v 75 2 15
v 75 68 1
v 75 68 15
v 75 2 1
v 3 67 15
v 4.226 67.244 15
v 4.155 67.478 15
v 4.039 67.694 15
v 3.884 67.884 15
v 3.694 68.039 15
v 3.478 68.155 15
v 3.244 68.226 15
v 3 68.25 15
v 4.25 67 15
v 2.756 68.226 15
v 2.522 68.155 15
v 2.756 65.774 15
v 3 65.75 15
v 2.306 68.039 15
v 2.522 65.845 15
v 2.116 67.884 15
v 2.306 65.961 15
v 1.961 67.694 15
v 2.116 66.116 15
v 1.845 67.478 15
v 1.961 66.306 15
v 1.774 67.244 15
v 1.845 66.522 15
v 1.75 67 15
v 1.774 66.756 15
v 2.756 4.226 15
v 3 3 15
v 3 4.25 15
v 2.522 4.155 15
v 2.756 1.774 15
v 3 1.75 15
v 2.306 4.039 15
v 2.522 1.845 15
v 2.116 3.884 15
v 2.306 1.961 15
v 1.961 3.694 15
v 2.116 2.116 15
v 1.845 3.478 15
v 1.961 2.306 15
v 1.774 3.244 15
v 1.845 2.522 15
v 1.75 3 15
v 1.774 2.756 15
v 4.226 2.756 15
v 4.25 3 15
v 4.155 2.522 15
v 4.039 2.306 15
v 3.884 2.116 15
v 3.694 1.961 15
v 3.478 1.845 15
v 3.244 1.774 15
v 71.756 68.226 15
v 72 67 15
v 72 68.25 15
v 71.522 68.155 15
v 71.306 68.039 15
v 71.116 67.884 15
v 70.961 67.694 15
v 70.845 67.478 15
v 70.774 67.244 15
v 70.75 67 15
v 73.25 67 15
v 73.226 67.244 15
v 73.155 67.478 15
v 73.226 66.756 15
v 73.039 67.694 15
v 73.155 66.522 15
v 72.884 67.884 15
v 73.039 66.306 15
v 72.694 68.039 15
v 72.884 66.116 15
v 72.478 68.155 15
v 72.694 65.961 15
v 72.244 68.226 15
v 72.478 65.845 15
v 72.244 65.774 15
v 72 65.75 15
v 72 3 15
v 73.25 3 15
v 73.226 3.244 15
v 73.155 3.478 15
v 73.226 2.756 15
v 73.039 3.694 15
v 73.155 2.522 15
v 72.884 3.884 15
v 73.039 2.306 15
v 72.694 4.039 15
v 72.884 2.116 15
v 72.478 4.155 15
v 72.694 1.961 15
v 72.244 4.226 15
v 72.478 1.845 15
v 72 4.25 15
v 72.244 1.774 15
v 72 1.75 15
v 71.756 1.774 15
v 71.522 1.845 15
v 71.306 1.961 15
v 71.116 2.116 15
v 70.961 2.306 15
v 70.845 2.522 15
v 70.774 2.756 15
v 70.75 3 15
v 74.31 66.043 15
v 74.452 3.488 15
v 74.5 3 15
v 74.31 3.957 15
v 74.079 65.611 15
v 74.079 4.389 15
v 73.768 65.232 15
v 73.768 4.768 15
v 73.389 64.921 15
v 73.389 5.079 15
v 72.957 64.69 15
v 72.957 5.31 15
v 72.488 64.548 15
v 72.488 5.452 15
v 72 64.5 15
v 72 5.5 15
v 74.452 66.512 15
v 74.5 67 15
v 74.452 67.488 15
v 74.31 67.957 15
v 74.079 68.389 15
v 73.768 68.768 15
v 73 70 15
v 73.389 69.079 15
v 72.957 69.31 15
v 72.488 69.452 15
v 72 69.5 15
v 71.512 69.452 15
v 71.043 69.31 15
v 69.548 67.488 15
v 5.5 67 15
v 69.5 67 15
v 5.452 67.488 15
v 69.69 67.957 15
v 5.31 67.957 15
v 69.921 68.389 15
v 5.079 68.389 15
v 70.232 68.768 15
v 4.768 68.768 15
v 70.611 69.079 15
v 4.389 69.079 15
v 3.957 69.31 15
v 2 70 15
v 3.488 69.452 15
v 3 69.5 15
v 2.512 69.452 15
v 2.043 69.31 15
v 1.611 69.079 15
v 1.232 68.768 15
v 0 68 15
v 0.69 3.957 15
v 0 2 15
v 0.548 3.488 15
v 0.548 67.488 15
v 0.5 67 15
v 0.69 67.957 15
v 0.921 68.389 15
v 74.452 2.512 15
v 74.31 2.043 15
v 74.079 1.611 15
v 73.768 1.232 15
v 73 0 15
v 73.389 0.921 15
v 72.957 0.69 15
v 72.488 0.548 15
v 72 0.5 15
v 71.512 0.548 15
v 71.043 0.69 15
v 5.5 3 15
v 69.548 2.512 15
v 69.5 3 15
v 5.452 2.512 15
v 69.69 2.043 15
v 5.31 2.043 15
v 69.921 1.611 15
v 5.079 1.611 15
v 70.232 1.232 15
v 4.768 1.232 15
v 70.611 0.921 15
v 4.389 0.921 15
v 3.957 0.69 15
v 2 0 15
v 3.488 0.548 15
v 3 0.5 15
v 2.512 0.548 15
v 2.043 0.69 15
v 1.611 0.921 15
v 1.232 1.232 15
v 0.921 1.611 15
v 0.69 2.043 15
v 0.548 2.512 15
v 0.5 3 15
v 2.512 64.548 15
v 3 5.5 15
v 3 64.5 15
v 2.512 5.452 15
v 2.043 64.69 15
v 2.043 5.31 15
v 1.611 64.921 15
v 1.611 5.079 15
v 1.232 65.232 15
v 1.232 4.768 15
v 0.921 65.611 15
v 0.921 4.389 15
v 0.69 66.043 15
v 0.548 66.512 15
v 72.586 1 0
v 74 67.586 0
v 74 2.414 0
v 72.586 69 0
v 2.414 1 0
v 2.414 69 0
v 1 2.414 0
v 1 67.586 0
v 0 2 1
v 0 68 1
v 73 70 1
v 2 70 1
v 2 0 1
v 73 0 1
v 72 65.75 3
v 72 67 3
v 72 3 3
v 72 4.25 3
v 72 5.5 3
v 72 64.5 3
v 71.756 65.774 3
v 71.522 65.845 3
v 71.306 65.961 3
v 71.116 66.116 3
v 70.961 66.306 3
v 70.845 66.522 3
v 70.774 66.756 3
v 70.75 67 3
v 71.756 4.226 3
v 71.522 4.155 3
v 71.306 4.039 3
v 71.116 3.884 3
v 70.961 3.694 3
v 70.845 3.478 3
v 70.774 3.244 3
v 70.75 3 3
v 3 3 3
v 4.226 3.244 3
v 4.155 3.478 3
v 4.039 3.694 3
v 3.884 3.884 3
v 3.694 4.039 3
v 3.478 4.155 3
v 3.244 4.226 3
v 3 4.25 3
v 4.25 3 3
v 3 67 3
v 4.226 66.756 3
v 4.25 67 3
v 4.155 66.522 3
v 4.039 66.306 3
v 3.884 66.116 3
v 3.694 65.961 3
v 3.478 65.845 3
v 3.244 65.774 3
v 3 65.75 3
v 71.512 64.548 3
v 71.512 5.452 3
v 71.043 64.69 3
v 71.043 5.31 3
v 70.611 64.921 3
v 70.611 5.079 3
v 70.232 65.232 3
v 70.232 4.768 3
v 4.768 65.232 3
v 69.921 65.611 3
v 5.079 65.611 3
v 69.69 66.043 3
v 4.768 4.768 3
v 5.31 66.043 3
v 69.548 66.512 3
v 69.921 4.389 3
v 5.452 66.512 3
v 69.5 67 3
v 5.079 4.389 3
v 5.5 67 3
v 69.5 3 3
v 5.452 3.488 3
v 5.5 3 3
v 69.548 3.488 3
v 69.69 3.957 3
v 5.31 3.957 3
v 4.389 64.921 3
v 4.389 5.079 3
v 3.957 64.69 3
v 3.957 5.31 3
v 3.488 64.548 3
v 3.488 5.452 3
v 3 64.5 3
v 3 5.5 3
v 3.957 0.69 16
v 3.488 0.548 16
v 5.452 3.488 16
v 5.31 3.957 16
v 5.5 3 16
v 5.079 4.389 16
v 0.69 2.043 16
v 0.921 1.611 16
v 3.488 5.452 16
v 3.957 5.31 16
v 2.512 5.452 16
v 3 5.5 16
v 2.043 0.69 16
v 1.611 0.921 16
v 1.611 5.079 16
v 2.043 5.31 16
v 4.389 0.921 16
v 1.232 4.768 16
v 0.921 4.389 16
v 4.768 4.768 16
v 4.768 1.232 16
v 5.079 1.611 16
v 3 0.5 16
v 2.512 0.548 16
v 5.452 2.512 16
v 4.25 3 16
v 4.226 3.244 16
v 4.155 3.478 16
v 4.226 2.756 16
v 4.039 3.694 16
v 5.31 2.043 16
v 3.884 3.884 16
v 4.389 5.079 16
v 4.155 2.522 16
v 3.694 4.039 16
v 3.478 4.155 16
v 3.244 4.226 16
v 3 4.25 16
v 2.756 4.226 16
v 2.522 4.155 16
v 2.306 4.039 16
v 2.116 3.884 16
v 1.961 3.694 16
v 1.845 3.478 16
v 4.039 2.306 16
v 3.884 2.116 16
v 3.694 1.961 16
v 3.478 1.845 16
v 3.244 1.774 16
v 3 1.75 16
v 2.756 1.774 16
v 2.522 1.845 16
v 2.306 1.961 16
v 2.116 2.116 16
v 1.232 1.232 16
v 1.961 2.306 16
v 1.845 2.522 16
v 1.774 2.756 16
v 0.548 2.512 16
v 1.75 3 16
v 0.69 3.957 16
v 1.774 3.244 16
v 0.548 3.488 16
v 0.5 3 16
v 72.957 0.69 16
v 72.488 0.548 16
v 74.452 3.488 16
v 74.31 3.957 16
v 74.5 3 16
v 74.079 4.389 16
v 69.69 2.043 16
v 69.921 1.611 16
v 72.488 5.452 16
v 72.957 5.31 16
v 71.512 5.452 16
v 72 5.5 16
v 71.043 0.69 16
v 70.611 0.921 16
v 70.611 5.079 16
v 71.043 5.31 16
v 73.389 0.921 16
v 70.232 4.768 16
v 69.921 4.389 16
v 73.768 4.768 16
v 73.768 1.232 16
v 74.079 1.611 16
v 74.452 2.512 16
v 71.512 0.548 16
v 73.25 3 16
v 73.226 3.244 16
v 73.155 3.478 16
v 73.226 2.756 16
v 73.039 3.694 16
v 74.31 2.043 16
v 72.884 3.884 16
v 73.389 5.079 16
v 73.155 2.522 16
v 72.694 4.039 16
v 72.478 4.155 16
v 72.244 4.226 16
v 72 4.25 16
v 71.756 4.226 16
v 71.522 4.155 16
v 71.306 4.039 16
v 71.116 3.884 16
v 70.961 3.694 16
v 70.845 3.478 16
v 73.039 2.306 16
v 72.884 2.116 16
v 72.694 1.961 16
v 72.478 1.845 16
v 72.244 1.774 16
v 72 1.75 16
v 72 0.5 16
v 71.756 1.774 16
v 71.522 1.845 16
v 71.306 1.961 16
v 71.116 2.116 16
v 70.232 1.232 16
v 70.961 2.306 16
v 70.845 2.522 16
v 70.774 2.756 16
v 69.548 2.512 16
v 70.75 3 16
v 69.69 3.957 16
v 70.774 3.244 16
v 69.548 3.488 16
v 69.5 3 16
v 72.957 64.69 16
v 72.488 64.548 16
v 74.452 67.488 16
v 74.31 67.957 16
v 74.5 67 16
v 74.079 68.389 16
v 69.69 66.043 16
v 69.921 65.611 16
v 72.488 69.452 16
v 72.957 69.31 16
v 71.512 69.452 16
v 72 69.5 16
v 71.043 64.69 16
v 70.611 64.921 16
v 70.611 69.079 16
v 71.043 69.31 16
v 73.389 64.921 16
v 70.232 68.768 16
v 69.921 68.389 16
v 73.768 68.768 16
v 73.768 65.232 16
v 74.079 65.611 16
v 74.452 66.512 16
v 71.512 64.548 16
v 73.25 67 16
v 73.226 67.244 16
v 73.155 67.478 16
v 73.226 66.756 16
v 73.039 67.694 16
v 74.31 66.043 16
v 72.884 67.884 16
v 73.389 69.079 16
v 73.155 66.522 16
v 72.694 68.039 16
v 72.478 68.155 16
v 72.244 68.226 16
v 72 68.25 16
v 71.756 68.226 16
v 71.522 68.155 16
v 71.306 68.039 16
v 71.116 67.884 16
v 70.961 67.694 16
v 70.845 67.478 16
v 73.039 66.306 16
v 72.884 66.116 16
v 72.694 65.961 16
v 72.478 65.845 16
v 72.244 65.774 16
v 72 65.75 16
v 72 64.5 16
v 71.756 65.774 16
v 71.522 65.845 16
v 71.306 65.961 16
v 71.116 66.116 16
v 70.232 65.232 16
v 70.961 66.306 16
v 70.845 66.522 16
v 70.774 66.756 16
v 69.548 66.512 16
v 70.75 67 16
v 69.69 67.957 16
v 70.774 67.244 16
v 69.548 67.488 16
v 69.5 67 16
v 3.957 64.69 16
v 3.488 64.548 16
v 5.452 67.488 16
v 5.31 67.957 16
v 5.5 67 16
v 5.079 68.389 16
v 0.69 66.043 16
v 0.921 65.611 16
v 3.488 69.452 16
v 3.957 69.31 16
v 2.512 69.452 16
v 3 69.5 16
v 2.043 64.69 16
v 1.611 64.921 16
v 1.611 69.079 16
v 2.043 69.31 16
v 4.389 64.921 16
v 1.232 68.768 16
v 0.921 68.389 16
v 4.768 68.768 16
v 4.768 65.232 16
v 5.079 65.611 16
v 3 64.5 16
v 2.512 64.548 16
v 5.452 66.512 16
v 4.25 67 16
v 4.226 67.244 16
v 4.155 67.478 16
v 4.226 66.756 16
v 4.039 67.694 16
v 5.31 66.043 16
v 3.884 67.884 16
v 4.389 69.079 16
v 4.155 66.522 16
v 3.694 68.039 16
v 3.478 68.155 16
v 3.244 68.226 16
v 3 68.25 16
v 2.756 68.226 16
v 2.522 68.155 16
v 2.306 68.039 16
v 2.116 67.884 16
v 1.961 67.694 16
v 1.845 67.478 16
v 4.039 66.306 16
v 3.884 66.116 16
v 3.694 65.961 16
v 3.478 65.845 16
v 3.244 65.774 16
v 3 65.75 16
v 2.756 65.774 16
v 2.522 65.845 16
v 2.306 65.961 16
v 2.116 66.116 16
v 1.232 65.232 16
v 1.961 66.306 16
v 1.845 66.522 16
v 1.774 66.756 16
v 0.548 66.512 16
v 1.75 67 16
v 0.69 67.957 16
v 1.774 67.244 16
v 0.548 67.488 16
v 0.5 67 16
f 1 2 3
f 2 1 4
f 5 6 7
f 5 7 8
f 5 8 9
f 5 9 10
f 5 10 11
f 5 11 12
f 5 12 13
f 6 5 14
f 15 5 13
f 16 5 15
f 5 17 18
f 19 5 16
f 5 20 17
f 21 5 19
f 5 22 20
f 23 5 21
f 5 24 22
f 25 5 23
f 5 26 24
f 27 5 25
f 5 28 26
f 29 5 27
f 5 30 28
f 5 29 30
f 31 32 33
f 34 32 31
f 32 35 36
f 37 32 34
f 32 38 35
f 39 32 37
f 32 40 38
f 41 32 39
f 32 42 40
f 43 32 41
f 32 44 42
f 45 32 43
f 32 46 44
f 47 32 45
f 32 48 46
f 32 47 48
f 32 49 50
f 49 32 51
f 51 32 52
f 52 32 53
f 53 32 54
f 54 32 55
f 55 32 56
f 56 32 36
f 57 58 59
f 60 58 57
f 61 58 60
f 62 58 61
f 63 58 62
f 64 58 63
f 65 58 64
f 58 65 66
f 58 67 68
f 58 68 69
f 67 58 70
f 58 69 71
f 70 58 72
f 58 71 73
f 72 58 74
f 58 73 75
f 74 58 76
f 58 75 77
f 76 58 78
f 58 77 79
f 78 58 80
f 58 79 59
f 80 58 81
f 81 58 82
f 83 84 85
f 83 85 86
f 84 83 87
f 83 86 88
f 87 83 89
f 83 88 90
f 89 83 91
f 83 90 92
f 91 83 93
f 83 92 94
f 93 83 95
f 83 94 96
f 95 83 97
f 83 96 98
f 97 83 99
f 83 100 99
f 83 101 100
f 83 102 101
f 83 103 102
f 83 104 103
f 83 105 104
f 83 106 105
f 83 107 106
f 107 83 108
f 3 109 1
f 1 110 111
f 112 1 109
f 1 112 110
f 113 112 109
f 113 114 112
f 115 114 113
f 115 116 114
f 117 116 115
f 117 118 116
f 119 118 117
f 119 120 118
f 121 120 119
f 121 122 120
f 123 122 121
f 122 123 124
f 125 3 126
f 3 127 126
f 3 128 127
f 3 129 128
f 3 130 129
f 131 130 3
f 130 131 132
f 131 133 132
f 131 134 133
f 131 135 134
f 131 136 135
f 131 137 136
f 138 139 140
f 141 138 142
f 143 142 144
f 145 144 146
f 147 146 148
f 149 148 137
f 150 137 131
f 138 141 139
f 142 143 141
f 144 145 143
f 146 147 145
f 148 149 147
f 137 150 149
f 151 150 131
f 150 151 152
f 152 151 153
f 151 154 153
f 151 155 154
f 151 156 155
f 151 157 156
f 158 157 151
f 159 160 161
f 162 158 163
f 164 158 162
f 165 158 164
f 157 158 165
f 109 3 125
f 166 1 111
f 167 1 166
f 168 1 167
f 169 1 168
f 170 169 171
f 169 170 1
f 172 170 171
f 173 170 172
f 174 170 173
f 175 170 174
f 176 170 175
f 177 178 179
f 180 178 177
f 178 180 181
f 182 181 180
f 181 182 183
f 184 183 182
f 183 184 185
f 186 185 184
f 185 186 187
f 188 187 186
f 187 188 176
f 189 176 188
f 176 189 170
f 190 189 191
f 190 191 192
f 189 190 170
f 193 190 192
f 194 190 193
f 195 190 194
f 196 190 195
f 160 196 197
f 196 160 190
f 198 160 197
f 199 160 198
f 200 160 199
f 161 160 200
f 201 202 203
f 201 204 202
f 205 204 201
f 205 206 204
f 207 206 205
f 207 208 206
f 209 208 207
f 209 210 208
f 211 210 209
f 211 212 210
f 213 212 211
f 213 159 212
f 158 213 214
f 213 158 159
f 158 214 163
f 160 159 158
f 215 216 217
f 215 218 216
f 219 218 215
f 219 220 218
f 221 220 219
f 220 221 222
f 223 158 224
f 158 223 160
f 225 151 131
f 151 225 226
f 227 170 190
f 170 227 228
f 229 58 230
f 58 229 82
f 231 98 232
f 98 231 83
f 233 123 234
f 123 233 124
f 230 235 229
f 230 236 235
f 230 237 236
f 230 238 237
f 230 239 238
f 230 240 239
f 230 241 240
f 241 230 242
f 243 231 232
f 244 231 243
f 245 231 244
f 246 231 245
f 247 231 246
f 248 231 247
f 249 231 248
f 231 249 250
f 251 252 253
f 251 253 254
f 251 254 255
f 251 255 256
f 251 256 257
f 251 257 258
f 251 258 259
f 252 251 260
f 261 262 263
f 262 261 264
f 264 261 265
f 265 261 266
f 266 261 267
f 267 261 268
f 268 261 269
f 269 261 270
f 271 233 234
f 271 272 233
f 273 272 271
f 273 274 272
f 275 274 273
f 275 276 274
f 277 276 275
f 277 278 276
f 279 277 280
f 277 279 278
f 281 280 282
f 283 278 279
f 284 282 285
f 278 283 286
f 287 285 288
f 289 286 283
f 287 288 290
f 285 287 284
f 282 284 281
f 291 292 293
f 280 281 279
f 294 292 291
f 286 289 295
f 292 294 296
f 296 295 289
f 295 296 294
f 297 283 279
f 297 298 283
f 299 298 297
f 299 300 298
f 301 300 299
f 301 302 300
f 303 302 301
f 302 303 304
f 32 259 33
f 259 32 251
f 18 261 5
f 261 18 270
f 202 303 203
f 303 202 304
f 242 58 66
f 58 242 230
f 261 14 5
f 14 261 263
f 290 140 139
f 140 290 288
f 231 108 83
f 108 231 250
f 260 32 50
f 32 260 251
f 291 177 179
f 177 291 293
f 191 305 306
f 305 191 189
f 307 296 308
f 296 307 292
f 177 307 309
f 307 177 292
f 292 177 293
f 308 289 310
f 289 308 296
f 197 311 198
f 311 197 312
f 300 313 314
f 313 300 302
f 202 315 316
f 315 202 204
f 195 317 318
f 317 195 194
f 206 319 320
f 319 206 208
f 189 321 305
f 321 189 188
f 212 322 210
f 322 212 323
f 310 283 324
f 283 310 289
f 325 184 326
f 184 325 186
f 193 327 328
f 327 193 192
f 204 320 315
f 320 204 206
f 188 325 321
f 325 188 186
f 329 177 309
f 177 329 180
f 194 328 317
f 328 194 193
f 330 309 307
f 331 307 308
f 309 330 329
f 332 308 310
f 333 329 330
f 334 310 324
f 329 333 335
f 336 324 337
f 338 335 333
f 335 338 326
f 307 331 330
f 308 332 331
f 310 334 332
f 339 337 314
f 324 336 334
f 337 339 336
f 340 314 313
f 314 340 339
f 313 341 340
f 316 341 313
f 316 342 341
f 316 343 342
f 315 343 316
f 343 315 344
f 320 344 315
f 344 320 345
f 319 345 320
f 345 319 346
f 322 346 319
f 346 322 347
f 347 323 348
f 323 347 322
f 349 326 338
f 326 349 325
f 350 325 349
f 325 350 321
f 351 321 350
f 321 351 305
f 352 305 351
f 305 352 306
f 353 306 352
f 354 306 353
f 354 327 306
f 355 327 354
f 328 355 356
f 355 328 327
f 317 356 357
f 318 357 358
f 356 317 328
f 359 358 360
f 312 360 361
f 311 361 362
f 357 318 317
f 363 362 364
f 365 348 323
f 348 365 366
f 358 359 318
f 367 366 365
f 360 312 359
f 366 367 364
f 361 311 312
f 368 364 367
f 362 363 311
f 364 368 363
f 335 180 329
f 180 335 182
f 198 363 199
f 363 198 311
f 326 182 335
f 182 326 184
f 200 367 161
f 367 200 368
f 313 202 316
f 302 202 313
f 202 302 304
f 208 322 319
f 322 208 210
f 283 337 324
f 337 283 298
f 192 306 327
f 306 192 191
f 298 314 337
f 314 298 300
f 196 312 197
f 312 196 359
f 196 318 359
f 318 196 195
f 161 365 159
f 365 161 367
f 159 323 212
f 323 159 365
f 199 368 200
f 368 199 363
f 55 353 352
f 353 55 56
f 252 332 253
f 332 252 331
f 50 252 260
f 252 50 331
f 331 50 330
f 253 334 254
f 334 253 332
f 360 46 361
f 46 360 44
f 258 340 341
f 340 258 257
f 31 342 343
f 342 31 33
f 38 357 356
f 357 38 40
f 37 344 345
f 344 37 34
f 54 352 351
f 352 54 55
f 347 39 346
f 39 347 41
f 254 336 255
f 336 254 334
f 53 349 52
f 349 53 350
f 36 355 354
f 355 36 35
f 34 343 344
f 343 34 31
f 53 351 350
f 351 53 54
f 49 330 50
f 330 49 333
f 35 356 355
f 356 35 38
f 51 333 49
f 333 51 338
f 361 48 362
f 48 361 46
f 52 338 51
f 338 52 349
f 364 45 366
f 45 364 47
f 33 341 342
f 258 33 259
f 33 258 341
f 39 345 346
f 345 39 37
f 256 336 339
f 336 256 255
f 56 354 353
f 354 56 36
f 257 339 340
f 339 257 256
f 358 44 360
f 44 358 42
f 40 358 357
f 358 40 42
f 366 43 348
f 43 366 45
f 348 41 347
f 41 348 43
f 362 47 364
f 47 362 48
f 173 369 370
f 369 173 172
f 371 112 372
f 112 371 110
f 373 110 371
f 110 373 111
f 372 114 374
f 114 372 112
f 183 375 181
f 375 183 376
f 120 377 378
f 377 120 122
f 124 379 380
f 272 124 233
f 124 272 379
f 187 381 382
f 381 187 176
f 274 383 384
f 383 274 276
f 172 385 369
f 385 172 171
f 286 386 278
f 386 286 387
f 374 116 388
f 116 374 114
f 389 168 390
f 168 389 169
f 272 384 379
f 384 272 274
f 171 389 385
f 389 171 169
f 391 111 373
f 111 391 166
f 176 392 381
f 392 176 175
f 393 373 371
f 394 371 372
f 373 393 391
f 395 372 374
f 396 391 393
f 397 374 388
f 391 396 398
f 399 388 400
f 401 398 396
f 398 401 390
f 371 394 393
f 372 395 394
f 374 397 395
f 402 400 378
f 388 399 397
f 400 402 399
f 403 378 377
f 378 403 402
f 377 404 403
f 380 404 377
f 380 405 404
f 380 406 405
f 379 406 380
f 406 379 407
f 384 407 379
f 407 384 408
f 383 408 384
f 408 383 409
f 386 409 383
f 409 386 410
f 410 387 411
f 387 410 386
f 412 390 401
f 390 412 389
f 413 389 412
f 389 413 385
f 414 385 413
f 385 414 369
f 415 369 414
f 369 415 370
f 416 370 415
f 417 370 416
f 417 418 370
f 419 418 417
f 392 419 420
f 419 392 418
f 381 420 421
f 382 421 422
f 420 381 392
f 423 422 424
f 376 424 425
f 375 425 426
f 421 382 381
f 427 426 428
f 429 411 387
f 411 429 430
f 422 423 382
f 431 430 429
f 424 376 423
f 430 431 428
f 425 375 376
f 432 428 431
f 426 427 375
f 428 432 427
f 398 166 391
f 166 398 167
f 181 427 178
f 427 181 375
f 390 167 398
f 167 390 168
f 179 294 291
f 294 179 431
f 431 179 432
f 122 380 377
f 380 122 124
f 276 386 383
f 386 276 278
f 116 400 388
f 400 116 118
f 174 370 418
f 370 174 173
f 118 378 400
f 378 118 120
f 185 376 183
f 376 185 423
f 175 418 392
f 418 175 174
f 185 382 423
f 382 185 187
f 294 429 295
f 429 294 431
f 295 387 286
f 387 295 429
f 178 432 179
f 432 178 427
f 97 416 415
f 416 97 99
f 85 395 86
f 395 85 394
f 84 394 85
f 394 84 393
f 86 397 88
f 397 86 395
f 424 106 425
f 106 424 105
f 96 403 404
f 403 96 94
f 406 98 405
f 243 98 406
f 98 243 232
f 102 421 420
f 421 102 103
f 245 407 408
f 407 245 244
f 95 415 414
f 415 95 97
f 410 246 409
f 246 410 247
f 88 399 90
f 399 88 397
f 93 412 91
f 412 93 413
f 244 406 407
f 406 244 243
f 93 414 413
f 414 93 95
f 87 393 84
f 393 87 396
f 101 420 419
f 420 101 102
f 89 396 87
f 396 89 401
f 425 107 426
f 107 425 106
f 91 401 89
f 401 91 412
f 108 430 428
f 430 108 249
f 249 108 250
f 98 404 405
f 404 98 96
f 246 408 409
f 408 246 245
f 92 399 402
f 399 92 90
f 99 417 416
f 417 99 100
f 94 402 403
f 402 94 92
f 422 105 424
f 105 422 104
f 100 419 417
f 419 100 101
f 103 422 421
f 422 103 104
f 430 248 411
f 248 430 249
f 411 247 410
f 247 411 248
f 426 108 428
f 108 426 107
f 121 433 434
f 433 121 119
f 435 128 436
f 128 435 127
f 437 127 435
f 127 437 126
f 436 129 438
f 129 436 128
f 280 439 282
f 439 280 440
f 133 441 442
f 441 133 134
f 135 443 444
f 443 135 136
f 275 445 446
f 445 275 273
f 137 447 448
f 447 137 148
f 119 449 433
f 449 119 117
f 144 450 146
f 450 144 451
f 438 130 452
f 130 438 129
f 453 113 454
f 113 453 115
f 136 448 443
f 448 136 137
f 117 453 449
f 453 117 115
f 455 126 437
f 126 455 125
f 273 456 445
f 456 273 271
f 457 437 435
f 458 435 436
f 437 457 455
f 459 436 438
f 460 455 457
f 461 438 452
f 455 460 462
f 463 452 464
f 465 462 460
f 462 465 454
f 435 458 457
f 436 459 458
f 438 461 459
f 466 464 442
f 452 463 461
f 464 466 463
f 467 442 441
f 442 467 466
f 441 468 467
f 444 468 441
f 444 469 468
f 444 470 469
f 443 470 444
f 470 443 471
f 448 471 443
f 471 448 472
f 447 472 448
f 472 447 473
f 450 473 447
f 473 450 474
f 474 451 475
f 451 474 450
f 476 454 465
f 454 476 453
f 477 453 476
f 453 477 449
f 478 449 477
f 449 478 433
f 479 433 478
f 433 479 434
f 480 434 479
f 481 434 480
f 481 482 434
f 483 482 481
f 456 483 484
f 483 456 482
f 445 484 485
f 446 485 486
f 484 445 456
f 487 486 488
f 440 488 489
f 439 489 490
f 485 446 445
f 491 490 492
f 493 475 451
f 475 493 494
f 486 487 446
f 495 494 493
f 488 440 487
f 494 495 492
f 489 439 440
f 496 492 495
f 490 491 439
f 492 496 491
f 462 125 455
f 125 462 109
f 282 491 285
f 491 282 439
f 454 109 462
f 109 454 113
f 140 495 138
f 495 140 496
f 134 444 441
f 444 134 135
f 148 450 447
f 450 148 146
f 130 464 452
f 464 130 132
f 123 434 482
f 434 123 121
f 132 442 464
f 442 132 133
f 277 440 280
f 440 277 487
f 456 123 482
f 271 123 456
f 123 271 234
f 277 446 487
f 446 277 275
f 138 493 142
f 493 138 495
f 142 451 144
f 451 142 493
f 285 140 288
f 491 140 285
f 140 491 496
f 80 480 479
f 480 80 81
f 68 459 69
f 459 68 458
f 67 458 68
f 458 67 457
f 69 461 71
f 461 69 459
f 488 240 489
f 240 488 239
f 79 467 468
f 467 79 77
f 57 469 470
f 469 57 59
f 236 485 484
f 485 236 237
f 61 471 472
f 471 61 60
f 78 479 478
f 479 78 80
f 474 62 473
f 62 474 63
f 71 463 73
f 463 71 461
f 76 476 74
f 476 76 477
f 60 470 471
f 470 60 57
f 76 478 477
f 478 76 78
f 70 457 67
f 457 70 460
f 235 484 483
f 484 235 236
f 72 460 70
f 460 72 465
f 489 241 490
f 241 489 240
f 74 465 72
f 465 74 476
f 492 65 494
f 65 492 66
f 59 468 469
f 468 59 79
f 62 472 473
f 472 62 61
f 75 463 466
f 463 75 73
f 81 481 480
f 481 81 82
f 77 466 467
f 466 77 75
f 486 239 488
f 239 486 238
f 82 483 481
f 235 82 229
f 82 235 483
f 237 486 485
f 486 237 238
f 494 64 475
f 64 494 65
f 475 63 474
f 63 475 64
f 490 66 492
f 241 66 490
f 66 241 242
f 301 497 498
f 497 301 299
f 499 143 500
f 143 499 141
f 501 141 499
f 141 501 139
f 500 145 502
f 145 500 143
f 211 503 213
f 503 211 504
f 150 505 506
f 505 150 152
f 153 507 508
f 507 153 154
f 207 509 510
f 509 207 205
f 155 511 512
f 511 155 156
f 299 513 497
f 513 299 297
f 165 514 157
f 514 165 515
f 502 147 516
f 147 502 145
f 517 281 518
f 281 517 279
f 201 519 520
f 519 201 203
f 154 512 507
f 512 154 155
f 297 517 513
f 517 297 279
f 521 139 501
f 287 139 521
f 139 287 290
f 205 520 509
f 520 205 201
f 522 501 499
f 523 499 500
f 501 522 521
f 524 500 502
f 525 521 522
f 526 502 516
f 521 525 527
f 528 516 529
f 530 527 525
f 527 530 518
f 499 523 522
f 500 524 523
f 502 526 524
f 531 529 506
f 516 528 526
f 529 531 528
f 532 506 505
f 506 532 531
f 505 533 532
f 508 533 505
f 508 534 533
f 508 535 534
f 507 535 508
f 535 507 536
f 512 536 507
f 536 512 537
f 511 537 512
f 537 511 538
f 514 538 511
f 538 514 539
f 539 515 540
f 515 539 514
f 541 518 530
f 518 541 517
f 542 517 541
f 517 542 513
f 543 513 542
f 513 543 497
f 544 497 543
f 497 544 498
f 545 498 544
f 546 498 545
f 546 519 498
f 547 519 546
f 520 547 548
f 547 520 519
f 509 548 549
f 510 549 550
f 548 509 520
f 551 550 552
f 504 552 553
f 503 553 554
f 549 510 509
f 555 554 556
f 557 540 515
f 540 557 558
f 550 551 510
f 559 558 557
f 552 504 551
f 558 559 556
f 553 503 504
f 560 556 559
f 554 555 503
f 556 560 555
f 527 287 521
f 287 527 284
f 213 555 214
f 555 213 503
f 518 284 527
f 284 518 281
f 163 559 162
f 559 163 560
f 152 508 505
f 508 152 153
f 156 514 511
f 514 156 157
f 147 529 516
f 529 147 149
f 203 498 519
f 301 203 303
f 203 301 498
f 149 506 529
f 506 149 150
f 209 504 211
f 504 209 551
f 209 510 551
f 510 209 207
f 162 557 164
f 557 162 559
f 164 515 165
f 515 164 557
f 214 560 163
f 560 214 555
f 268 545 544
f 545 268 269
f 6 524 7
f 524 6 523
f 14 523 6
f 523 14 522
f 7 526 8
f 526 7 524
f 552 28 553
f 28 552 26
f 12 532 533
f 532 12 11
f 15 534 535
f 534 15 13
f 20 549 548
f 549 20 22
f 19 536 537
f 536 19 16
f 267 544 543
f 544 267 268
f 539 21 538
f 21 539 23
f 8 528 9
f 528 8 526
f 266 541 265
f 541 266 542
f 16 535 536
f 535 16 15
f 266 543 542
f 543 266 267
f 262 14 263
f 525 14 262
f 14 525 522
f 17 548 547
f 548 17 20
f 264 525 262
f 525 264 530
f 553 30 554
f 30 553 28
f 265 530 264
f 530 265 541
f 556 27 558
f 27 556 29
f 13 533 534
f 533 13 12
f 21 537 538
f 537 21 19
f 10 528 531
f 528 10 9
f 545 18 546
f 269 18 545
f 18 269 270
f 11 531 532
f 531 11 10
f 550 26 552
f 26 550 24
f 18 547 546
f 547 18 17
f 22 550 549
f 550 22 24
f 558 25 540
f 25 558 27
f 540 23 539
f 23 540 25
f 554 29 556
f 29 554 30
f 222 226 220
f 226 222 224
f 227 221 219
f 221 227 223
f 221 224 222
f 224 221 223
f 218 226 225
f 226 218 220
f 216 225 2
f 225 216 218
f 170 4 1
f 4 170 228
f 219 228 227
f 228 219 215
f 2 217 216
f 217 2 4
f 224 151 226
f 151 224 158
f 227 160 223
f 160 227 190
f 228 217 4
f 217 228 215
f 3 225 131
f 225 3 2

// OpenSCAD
// LoRa + ESP32 case - exterior styling pass
// internals identical to case_Lora_3D_2.scad
$fn = 32;

/* ---------- outer dims ---------- */
L  = 75;   // x
W  = 70;   // y
H  = 20;   // z

/* ---------- decoration params ---------- */
corner_cut   = 2.0;   // 45 deg vertical corner chamfer
top_cham     = 1.0;   // top edge chamfer
bot_cham     = 1.0;   // bottom edge chamfer (print-friendly)

groove_z     = 13.0;  // accent band, above SMA (12.2) and USB (11.5)
groove_h     = 1.0;
groove_d     = 0.7;

flute_on     = true;
flute_z0     = 15.2;
flute_z1     = 18.6;
flute_dia    = 1.6;
flute_depth  = 0.7;
flute_pitch  = 6;
flute_y0     = 8;
flute_n      = 10;


label_on     = true;
label_txt    = "LoRa";
label_size   = 6;
label_z      = 9;
label_depth  = 0.6;

/* ---------- footprint with cut corners ---------- */
module foot2d(){
    polygon([[corner_cut,0],[L-corner_cut,0],
             [L,corner_cut],[L,W-corner_cut],
             [L-corner_cut,W],[corner_cut,W],
             [0,W-corner_cut],[0,corner_cut]]);
}

// convex envelope: cut corners + top/bottom edge chamfers
module envelope(){
    hull(){
        linear_extrude(0.01) offset(delta=-bot_cham) foot2d();
        translate([0,0,bot_cham]) linear_extrude(H-bot_cham-top_cham) foot2d();
        translate([0,0,H-0.01]) linear_extrude(0.01) offset(delta=-top_cham) foot2d();
    }
}

/* ---------- decoration cuts ---------- */
module accent_groove(){
    translate([0,0,groove_z])
    linear_extrude(groove_h)
        difference(){
            offset(delta=0.5) foot2d();
            offset(delta=-groove_d) foot2d();
        }
}

module flute(){                        // vertical capsule, rounded ends
    hull(){
        translate([0,0,flute_z0]) sphere(d=flute_dia);
        translate([0,0,flute_z1]) sphere(d=flute_dia);
    }
}

module flutes(){
    off = flute_depth - flute_dia/2;   // surface offset for wanted depth
    for(i=[0:flute_n-1]){
        y = flute_y0 + i*flute_pitch;
        translate([off,   y, 0]) flute();   // left wall  (x=0)
        translate([L-off, y, 0]) flute();   // right wall (x=L)
    }
}

module label(){                        // engraved, back wall y=W
    translate([L/2, W-label_depth, label_z]) rotate([-90,0,0])
        linear_extrude(label_depth*2)
            text(label_txt, size=label_size, halign="center",
                 valign="center", font="Liberation Sans:style=Bold");
}

module decorations(){
    accent_groove();
    if(flute_on) flutes();
    if(label_on) label();
}

/* ---------- body (unchanged internals) ---------- */
module body(){
union(){
difference(){

    union(){
        ///////CASE WALLS
        //case (+ 3 mm walls)
        cube([75,70,15]);
        }

    //case cavity
    translate([3,3,3]) cube([69,64,21]);
    /*
    //SMA connector cavity
    translate([-5,21.5,9]) rotate([0,90,0])
    cylinder(h = 11.5,d = 6.45 );
    /*
    //DX-LR02 cavity
   translate([3,4+3.5,3])cube([35,18,6]);

    /*
    //ESP32 cavity
    translate([0,0,1.5])
        union(){
    translate([69-28,3,2])cube([28,55,6]);
            /*
    //USB-C cavity
    hull(){
        translate([69-(28/2)+2.75,6,5]) rotate([90,0,0]) cylinder(h=7,d=10);
        translate([69-(28/2)-2.75,6,5]) rotate([90,0,0]) cylinder(h=7,d=10);
        }
    }*/
}

//case-closing-screws turrets
        
        difference(){
        translate([3,3,2]) cylinder(h=14,d=5);
            translate([3,3,2])cylinder(h=20,d=2.5);  //screw hole
        }
        difference(){
        translate([72,3,2]) cylinder(h=14,d=5);
            translate([72,3,2])cylinder(h=20,d=2.5);

        }
        difference(){
        translate([72,67,2]) cylinder(h=14,d=5);
            translate([72,67,2])cylinder(h=20,d=2.5);
        }

        difference(){
        translate([3,67,2]) cylinder(h=14,d=5);
            translate([3,67,2])cylinder(h=20,d=2.5);
            }
       /*
       //esp32 screwholes
            difference(){
        translate([69-26,5,3])cube([3.5,3.5,3.5],center = true);
                translate([69-26,5,5])cylinder(h=3,d=2.5,center = true);
            }
                        difference(){
        translate([69-2,5,3])cube([3.5,3.5,3.5],center = true);
                translate([69-2,5,5])cylinder(h=3,d=2.5,center = true);
            }
                     difference(){
        translate([69-26,52,3])cube([3.5,3.5,3.5],center = true);
                translate([69-26,52,5])cylinder(h=3,d=2.5,center = true);
            }
                     difference(){
        translate([69-2,52,3])cube([3.5,3.5,3.5],center = true);
                translate([69-2,52,5])cylinder(h=3,d=2.5,center = true);
            }*/
        }
}

/* ---------- final ---------- */
difference(){
    intersection(){
        body();
        envelope();
    }
    //decorations();
}
